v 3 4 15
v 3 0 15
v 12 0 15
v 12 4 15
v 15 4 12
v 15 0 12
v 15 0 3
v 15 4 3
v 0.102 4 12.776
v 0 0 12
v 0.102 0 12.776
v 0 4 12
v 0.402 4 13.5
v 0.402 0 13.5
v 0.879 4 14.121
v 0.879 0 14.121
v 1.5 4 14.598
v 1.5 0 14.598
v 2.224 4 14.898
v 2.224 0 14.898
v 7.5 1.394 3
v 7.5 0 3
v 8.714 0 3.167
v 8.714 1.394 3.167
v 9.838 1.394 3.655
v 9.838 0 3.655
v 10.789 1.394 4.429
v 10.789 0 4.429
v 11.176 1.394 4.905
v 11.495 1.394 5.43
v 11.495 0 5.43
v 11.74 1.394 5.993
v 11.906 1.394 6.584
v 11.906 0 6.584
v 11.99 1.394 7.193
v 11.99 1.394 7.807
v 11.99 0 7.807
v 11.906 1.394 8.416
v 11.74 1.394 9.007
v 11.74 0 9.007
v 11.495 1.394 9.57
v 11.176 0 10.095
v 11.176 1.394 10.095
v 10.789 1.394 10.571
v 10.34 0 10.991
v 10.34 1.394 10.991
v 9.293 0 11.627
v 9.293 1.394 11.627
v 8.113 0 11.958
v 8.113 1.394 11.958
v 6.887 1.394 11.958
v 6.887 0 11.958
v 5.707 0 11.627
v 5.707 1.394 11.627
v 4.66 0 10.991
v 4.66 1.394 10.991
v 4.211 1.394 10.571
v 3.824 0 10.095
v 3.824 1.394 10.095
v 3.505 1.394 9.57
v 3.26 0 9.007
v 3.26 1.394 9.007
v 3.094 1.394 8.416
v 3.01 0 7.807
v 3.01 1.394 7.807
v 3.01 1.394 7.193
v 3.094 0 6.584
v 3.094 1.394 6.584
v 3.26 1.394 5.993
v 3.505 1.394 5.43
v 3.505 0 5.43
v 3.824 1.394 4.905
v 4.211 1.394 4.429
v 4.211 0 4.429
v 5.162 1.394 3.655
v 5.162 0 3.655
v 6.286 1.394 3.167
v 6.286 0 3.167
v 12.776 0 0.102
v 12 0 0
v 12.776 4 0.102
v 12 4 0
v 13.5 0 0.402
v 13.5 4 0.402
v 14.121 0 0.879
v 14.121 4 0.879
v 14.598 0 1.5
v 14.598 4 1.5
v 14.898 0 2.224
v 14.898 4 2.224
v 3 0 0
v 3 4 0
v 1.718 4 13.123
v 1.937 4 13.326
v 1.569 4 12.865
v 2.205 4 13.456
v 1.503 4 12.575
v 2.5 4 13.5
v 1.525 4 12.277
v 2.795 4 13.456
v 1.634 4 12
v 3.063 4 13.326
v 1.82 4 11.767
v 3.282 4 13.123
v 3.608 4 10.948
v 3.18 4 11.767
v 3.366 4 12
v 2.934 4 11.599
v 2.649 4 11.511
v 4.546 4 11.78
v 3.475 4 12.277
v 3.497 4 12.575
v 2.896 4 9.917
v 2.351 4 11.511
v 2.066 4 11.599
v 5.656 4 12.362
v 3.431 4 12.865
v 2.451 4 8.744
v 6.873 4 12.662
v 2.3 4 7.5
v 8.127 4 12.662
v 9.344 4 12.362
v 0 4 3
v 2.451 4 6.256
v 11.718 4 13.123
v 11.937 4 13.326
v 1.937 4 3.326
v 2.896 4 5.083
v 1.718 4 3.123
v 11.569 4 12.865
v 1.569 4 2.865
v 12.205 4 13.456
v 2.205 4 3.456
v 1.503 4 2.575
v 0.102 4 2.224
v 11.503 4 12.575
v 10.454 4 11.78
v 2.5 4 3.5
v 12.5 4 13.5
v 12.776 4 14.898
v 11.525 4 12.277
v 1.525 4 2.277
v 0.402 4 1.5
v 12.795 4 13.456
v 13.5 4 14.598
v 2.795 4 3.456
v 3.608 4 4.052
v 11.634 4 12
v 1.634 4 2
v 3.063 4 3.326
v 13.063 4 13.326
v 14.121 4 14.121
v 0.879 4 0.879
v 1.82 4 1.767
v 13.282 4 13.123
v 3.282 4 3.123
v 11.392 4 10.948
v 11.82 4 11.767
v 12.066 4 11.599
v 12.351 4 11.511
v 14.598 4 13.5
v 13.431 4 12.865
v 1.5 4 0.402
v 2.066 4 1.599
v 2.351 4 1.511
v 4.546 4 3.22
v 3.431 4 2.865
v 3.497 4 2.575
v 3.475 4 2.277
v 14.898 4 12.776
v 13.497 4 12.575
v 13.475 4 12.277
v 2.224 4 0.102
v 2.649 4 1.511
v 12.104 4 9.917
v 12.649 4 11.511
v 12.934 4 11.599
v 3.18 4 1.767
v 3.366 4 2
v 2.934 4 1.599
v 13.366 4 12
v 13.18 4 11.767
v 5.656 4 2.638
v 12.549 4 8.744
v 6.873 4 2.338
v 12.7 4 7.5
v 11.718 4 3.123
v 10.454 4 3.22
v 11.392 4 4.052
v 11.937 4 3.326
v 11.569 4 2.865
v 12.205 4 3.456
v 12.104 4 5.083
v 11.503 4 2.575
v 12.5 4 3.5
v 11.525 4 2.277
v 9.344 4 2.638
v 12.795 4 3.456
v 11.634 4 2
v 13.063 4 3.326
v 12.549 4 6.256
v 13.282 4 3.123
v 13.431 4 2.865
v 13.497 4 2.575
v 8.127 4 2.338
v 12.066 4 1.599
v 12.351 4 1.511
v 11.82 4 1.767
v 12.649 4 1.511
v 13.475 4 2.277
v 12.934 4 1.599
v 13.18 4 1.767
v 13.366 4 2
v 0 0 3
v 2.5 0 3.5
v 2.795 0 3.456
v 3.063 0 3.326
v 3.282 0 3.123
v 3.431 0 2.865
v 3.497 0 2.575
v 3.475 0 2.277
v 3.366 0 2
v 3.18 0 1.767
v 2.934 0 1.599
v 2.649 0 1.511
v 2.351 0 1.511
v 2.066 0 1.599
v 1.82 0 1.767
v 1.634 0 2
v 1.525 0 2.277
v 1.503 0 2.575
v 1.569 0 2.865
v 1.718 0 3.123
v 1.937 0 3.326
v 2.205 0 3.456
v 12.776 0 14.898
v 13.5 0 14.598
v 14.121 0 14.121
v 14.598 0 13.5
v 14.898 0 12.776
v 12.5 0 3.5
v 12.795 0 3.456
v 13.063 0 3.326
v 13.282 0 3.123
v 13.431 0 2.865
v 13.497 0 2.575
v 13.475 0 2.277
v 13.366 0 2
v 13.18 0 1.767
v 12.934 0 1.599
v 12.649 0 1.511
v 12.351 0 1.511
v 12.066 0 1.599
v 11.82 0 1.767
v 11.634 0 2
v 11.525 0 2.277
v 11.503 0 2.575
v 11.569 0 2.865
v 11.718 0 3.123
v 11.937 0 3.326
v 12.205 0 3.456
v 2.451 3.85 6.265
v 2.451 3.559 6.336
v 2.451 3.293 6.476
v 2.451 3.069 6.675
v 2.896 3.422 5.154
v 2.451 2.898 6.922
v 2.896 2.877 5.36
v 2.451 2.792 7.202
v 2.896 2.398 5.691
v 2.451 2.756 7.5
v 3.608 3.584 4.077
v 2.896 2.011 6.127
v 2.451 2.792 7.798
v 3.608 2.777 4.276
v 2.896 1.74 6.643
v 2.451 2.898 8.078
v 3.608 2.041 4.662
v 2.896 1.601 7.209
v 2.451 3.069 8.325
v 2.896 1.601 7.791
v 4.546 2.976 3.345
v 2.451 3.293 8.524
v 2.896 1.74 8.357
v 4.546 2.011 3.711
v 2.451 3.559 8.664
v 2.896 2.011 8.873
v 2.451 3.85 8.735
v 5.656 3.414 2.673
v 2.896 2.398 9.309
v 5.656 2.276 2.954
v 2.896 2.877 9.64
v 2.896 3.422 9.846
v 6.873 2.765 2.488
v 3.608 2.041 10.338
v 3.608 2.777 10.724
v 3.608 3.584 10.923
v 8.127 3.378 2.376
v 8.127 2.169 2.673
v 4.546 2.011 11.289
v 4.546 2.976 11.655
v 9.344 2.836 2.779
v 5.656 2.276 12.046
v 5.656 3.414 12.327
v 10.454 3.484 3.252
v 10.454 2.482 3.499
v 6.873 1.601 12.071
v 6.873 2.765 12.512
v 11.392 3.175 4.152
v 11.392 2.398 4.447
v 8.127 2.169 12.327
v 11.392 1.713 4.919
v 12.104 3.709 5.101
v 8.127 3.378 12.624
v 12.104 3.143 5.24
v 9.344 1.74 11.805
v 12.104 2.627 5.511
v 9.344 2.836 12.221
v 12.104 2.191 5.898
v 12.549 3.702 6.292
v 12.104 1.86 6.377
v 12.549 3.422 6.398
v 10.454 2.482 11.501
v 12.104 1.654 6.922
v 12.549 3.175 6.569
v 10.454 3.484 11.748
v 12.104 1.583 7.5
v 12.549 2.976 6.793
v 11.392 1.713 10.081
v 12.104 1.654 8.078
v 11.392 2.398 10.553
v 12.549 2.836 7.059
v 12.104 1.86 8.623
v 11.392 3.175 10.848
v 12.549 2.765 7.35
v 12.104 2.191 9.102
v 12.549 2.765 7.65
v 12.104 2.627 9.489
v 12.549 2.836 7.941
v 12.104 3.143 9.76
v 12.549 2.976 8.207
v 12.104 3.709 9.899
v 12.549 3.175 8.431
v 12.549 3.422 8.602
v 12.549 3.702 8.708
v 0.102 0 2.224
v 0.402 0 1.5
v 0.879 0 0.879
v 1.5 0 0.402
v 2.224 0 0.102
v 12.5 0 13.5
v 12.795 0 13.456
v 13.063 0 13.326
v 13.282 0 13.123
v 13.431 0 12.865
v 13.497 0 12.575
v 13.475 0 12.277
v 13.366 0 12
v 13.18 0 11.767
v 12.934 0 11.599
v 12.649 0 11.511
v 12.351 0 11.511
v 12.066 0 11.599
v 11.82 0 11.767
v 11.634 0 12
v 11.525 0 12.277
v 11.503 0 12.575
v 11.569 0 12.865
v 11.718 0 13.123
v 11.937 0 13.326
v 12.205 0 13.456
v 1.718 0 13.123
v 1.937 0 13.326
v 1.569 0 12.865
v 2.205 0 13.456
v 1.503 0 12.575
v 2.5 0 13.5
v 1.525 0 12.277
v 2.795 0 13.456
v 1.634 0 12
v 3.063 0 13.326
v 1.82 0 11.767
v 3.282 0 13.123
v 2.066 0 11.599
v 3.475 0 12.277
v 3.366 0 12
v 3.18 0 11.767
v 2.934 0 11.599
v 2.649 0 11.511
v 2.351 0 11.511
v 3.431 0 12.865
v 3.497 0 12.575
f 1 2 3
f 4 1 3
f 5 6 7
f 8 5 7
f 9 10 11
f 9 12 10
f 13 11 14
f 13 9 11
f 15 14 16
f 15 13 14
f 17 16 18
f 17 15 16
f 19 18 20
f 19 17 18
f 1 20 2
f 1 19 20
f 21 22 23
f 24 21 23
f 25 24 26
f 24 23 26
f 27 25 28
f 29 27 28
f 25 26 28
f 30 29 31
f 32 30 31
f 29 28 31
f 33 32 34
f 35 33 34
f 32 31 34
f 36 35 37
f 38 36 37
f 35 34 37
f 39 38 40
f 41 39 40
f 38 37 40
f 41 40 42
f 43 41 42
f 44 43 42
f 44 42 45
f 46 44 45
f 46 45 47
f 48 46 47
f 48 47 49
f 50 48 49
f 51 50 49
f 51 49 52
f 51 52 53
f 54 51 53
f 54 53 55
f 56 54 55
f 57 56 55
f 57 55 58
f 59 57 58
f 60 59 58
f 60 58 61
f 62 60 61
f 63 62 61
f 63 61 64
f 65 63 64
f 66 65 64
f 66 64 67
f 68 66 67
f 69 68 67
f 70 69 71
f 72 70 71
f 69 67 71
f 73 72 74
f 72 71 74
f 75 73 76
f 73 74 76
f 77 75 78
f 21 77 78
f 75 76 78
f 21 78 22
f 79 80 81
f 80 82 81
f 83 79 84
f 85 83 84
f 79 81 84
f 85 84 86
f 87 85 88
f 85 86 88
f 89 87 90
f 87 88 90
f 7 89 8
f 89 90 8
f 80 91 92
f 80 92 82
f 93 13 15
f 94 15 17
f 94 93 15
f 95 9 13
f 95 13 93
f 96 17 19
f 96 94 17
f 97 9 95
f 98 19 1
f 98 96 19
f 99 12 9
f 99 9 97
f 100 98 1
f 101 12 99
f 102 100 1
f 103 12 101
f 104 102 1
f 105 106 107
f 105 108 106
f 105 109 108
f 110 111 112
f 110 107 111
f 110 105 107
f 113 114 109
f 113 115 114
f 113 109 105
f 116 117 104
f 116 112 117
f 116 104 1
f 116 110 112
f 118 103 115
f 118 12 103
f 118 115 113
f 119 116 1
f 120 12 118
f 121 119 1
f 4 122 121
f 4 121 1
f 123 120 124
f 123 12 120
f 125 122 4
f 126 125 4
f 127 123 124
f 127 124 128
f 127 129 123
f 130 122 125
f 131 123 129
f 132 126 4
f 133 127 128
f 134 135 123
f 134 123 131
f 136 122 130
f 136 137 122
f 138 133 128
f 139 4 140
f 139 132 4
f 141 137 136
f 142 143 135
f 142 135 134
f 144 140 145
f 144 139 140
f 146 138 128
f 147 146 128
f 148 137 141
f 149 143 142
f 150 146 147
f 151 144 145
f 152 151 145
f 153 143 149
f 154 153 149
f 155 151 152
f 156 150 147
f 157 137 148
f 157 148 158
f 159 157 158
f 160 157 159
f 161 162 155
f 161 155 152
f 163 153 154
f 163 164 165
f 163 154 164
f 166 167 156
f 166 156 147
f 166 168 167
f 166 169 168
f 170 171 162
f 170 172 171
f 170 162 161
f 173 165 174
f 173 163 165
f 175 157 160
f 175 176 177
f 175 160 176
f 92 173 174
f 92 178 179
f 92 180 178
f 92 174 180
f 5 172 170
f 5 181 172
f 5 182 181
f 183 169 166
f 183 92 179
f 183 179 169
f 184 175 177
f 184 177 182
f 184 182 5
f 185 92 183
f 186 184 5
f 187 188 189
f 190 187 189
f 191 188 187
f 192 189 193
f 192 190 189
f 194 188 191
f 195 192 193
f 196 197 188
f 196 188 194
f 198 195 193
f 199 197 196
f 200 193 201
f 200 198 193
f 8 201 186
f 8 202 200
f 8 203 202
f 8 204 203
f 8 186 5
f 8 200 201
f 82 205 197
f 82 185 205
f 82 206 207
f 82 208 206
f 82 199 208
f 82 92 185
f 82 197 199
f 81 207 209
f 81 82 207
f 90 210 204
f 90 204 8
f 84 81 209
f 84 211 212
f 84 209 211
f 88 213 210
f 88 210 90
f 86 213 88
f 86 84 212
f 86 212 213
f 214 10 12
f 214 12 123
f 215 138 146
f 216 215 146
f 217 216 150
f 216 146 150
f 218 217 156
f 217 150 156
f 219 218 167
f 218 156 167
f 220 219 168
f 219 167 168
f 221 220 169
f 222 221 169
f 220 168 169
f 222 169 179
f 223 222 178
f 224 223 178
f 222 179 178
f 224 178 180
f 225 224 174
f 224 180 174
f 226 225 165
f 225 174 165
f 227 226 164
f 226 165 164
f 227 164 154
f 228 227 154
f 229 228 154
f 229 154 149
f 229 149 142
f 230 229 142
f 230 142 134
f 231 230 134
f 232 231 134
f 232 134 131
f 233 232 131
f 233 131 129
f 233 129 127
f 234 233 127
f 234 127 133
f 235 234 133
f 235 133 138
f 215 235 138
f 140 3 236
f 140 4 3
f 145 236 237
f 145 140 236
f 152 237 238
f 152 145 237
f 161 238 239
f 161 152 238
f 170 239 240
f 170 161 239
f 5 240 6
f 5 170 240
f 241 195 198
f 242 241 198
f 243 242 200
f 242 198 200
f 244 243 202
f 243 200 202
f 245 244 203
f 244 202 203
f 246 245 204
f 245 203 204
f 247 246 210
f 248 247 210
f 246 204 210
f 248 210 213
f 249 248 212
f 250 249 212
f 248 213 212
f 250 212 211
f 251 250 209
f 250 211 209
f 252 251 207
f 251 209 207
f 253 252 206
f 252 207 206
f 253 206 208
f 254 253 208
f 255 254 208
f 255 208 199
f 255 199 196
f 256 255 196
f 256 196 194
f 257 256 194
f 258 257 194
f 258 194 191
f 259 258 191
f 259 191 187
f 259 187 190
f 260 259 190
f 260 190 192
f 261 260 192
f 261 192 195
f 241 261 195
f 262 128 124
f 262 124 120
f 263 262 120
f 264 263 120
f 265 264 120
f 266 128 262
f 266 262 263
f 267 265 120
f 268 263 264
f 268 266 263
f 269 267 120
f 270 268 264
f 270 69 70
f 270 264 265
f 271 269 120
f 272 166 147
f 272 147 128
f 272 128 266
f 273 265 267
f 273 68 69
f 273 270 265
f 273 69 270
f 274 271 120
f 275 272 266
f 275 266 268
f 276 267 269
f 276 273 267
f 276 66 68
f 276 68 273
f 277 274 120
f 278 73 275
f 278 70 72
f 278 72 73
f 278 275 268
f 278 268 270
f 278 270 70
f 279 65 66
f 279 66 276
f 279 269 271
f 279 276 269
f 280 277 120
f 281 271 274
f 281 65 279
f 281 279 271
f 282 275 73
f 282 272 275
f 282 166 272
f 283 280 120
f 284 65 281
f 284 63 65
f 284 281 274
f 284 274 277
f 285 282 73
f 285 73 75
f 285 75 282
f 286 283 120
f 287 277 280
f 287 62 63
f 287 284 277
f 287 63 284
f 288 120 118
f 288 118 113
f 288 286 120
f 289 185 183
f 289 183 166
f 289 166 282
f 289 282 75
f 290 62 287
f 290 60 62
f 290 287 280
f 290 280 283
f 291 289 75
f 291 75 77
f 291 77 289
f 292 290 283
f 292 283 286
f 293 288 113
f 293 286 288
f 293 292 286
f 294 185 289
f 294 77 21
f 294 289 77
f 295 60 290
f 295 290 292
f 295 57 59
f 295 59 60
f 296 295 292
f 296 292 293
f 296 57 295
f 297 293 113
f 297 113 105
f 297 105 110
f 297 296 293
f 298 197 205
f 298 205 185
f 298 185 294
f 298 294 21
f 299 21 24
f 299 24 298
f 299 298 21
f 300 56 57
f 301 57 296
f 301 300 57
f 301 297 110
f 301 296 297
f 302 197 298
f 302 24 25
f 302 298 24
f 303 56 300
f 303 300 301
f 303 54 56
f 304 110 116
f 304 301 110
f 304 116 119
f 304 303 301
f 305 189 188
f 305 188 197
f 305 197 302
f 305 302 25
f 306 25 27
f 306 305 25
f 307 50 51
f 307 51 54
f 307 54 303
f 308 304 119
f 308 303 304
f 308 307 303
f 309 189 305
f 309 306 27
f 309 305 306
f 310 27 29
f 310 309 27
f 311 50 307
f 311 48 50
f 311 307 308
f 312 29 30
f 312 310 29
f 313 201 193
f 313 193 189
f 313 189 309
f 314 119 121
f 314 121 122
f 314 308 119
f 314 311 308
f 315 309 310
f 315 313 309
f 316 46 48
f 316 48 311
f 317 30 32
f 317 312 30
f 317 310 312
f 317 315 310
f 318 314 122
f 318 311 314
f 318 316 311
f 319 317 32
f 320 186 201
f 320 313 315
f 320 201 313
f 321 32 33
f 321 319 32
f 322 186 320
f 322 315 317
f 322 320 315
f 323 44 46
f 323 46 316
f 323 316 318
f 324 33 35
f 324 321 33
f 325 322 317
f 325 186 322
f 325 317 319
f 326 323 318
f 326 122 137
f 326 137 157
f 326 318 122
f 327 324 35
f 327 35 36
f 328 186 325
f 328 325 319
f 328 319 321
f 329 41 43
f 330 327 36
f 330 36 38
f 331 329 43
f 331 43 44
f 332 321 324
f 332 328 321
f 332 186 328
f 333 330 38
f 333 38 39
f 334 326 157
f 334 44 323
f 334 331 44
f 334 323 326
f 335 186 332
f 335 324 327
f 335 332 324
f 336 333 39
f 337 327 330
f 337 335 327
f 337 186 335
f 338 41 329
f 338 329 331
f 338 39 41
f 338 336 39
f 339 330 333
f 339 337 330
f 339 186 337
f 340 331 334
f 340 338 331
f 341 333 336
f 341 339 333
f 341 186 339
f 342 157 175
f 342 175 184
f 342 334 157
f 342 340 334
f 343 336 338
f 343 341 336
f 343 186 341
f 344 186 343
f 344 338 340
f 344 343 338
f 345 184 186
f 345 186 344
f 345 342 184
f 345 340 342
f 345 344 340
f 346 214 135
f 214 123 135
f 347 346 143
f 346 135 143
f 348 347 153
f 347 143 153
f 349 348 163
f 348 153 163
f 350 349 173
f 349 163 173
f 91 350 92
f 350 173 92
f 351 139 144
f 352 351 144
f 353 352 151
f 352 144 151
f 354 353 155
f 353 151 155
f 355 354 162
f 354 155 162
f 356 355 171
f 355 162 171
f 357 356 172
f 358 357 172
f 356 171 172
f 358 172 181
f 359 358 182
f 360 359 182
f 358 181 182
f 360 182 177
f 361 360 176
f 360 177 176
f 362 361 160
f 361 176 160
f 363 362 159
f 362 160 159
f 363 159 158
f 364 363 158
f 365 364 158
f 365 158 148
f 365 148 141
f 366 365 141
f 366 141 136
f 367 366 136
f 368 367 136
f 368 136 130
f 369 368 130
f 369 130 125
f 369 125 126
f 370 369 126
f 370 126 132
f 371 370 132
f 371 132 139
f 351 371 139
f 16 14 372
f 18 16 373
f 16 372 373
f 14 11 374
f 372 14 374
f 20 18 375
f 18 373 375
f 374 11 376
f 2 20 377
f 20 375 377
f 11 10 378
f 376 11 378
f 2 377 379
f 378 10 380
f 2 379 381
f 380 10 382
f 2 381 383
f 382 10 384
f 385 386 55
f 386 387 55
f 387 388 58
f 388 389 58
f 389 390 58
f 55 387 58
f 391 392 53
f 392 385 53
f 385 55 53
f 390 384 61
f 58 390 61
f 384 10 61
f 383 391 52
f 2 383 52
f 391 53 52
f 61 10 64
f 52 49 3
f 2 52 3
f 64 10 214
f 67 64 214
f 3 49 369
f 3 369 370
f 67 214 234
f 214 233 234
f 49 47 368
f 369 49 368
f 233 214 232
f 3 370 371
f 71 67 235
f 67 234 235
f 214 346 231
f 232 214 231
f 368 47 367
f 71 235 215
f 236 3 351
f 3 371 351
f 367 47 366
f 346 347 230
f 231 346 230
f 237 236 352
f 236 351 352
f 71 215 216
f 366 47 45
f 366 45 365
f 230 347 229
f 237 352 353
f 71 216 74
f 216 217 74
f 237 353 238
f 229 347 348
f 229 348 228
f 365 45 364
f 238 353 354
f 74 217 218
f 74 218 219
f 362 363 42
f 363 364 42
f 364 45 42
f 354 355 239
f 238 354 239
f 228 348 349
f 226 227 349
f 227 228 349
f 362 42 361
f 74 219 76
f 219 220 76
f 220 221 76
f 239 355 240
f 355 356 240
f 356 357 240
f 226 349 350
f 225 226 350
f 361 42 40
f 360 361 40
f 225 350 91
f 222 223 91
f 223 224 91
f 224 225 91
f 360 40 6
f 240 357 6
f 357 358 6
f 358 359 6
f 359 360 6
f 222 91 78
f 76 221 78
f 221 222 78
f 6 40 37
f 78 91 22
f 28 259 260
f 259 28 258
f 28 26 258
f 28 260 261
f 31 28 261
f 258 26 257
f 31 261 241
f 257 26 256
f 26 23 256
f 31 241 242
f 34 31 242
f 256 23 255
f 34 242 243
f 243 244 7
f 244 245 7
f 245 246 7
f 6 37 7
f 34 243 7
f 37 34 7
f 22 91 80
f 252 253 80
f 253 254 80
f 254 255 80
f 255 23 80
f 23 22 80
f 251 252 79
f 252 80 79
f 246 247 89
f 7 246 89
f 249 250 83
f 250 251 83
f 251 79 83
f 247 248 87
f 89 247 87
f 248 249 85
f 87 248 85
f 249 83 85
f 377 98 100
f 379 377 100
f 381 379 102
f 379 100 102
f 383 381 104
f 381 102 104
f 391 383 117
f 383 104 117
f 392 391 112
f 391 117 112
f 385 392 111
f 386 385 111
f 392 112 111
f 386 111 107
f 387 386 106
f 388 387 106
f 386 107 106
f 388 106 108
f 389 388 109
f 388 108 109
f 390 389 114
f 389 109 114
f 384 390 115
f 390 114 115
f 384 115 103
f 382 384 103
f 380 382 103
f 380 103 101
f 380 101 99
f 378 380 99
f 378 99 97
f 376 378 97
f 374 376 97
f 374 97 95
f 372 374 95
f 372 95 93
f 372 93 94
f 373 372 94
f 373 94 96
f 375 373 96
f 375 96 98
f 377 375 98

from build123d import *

# Parameters (mm, degrees)
SKETCH1_W           = 15
SKETCH1_H           = 15
BOSS_EXTRUDE1_DEPTH = 4
SKETCH3_R           = 1
CUT_EXTRUDE1_DEPTH  = 22.587033145
SKETCH4_R           = 4.5
CUT_EXTRUDE2_DEPTH  = 22.587033145
FILLET1_R           = 3


with BuildPart() as part:
    # Sketch1 → Boss-Extrude1 (new body)
    with BuildSketch(Plane(origin=(0, 0, 0), x_dir=(1, 0, 0), z_dir=(0, 1, 0))):
        with Locations((7.5, -7.5)):
            Rectangle(SKETCH1_W, SKETCH1_H)
    extrude(amount=BOSS_EXTRUDE1_DEPTH)

    # Sketch2 → Cut-Revolve1 (revolve, cut)
    with BuildSketch(Plane(origin=(0, 4, 0), x_dir=(1, 0, 0), z_dir=(0, 1, 0))):
        with BuildLine():
            Line((12.7, -7.5), (2.3, -7.5))
            ThreePointArc((2.3, -7.5), (7.5, -12.7), (12.7, -7.5))
        make_face()
    revolve(axis=Axis((12.7, 4, 7.5), (-1, 0, 0)), mode=Mode.SUBTRACT)

    # Sketch3 → Cut-Extrude1 (cut, through all)
    with BuildSketch(Plane(origin=(0, 4, 0), x_dir=(1, 0, 0), z_dir=(0, 1, 0))):
        with Locations(Location((2.5, -12.5, 0), (0, 0, 270))):
            Circle(SKETCH3_R)
        with Locations(Location((12.5, -12.5, 0), (0, 0, 270))):
            Circle(SKETCH3_R)
        with Locations(Location((12.5, -2.5, 0), (0, 0, 270))):
            Circle(SKETCH3_R)
        with Locations(Location((2.5, -2.5, 0), (0, 0, 270))):
            Circle(SKETCH3_R)
    extrude(amount=-CUT_EXTRUDE1_DEPTH, mode=Mode.SUBTRACT)

    # Sketch4 → Cut-Extrude2 (cut, through all)
    with BuildSketch(Plane(origin=(0, 0, 0), x_dir=(-1, 0, 0), z_dir=(0, -1, 0))):
        with Locations(Location((-7.5, -7.5, 0), (0, 0, 90))):
            Circle(SKETCH4_R)
    extrude(amount=-CUT_EXTRUDE2_DEPTH, mode=Mode.SUBTRACT)

    # Fillet1
    fillet1_edges = [part.edges().sort_by_distance(p)[0] for p in [
        (0, 2, 0),
        (15, 2, 0),
        (15, 2, 15),
        (0, 2, 15),
    ]]
    fillet(fillet1_edges, radius=FILLET1_R)


solid = part.part
